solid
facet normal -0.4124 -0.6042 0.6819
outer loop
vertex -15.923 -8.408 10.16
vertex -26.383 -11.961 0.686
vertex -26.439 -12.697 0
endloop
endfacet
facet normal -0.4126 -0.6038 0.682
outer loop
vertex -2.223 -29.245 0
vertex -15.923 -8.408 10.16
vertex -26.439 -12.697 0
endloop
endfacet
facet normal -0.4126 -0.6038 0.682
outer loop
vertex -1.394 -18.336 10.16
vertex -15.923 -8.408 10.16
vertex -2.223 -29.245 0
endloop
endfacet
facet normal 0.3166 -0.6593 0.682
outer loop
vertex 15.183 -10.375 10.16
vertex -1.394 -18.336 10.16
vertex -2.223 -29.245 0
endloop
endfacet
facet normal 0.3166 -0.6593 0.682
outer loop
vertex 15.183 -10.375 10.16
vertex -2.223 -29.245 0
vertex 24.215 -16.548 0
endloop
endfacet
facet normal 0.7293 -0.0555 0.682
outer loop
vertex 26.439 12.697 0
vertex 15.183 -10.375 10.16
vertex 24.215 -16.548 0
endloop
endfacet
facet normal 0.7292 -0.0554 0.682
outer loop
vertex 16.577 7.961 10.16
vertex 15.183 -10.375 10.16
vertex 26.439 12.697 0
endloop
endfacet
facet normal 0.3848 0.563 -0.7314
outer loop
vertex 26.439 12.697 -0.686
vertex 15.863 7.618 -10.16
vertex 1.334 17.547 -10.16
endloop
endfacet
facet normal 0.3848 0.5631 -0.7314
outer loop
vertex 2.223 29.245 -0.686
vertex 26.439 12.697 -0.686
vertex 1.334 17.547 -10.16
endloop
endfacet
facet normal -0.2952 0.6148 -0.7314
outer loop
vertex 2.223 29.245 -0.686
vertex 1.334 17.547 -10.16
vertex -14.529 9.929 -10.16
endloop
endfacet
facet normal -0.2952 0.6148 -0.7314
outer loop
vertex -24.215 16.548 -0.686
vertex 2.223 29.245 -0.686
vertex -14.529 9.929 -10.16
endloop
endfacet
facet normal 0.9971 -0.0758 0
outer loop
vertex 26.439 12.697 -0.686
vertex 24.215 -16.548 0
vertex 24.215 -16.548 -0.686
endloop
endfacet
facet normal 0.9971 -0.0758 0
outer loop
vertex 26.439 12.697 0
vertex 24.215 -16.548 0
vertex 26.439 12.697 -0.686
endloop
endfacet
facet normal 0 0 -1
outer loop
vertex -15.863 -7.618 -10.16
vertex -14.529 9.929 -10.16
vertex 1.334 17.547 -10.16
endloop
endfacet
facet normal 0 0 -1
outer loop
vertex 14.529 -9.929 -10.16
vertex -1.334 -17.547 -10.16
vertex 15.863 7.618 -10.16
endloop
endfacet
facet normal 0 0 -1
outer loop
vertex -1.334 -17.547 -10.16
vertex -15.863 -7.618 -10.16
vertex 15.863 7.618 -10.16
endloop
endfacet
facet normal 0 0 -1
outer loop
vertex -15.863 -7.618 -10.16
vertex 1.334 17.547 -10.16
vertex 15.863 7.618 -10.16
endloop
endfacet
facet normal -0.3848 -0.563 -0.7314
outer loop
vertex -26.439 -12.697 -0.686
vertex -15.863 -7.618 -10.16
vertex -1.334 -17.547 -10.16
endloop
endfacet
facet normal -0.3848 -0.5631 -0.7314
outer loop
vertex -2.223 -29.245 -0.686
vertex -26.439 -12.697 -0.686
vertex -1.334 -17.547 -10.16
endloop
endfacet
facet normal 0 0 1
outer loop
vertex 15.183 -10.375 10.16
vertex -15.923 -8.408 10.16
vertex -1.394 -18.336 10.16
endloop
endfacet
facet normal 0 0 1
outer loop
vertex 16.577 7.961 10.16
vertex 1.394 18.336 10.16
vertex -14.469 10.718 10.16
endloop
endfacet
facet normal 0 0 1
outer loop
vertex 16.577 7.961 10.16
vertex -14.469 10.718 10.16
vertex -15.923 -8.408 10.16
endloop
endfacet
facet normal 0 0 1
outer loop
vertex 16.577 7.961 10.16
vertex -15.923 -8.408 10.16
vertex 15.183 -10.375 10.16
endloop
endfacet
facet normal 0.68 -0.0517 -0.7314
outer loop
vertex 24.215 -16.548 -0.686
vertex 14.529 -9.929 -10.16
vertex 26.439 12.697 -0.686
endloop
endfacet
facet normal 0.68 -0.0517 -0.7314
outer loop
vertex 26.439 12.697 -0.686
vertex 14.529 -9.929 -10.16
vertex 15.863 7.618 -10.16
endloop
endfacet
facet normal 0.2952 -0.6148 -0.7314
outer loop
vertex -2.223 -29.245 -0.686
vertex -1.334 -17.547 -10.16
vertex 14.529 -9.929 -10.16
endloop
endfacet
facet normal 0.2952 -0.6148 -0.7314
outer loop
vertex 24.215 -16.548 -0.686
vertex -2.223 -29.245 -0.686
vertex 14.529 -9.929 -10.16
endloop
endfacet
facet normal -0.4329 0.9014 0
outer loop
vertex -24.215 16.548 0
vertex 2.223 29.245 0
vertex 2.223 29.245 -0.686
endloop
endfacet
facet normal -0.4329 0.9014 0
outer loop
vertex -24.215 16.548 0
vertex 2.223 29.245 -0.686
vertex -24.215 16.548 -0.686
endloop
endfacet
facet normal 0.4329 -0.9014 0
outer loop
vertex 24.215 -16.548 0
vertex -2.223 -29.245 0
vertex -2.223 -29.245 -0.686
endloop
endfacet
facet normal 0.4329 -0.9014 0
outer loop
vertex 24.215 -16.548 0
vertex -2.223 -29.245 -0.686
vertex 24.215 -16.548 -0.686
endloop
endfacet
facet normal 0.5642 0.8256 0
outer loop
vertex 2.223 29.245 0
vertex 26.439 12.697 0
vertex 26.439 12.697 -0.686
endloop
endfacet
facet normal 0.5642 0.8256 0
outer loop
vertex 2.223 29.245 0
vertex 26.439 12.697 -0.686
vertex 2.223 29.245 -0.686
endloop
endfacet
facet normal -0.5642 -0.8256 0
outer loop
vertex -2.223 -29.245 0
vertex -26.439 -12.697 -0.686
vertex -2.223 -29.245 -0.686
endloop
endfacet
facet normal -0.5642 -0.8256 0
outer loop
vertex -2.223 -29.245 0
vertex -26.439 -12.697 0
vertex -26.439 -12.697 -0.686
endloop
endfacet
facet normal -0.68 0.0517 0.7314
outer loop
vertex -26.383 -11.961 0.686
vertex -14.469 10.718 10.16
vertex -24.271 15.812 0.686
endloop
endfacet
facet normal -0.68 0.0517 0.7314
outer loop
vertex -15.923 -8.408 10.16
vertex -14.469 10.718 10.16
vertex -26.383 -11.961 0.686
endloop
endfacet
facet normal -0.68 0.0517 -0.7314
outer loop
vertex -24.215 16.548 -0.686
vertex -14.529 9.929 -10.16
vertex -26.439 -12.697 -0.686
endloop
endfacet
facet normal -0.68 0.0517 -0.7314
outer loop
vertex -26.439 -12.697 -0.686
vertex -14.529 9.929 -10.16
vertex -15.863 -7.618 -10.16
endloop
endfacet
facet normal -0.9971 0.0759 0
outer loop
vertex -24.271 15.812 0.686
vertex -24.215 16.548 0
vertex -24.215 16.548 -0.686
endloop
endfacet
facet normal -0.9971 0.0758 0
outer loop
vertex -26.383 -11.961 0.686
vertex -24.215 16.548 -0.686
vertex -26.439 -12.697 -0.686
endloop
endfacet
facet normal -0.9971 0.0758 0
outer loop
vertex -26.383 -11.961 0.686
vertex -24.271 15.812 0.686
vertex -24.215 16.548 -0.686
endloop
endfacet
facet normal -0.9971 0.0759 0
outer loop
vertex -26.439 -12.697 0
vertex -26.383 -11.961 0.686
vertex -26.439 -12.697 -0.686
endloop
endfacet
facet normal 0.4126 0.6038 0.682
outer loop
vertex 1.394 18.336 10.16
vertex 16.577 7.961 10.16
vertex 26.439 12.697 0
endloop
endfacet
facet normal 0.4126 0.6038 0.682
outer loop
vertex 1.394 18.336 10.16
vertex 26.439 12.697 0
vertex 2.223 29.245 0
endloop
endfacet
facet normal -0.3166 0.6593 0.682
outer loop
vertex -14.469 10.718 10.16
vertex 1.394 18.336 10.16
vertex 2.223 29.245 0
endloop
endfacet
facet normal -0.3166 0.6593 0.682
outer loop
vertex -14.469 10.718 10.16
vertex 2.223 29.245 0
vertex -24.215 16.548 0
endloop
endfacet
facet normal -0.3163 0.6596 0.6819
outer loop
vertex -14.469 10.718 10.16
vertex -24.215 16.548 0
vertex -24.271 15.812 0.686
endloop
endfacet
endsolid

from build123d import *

# Parameters (mm, degrees)
F1_DEPTH     = 10.16
F2_C1_SIZE2  = 10.16
F2_C1_SIZE   = 9.4743532752
F2_C2_SIZE2  = 10.16
F2_C2_SIZE   = 9.4743532752
F2_C3_SIZE2  = 10.16
F2_C3_SIZE   = 9.4743532752
F2_C4_SIZE2  = 9.4743532752
F2_C4_SIZE   = 10.16
F2_C5_SIZE2  = 10.16
F2_C5_SIZE   = 9.4743532752
F2_C6_SIZE2  = 9.4743532752
F2_C6_SIZE   = 10.16
F2_C7_SIZE2  = 10.16
F2_C7_SIZE   = 9.4743532752
F2_C8_SIZE2  = 9.4743532752
F2_C8_SIZE   = 10.16
F2_C9_SIZE2  = 10.16
F2_C9_SIZE   = 9.4743532752
F2_C10_SIZE2 = 9.4743532752
F2_C10_SIZE  = 10.16
F2_C11_SIZE2 = 9.4743532752
F2_C11_SIZE  = 10.16
F2_C12_SIZE2 = 10.16
F2_C12_SIZE  = 9.4743532752


with BuildPart() as f1:
    # F0 (on Top) → F1 (new body, symmetric)
    with BuildSketch(Plane.XY):
        Polygon((-24.2152860866, 16.5479078158), (-26.4385515912, -12.697099003), (-2.2232655046, -29.2450068188), (24.2152860866, -16.5479078158), (26.4385515912, 12.697099003), (2.2232655046, 29.2450068188), align=None)
    extrude(amount=F1_DEPTH, both=True)

    # F2: chamfer of 10.16 x 9.4743532752 on 12 edges, made by hand

    # F2_c1
    f2_c1_edges = [f1.edges().sort_by_distance(p)[0] for p in [
        (-25.3269188389, 1.9254044064, -10.16),
    ]]
    f2_c1_side = f1.faces().sort_by_distance((-25.3269188389, 1.9254044064, -9.9705129345))[0]
    chamfer(f2_c1_edges, length=F2_C1_SIZE, length2=F2_C1_SIZE2, reference=f2_c1_side)

    # F2_c2
    f2_c2_edges = [f1.edges().sort_by_distance(p)[0] for p in [
        (-25.3269188389, 1.9254044064, 10.16),
    ]]
    f2_c2_side = f1.faces().sort_by_distance((-25.3269188389, 1.9254044064, 9.9705129345))[0]
    chamfer(f2_c2_edges, length=F2_C2_SIZE, length2=F2_C2_SIZE2, reference=f2_c2_side)

    # F2_c3
    f2_c3_edges = [f1.edges().sort_by_distance(p)[0] for p in [
        (-5.7082999727, 25.4358771179, -10.16),
    ]]
    f2_c3_side = f1.faces().sort_by_distance((-5.7082999727, 25.4358771179, -9.9705129345))[0]
    chamfer(f2_c3_edges, length=F2_C3_SIZE, length2=F2_C3_SIZE2, reference=f2_c3_side)

    # F2_c4
    f2_c4_edges = [f1.edges().sort_by_distance(p)[0] for p in [
        (-5.7082999727, 25.4358771179, 10.16),
    ]]
    f2_c4_side = f1.faces().sort_by_distance((-5.7082999727, 25.4358771179, 9.9705129345))[0]
    chamfer(f2_c4_edges, length=F2_C4_SIZE, length2=F2_C4_SIZE2, reference=f2_c4_side)

    # F2_c5
    f2_c5_edges = [f1.edges().sort_by_distance(p)[0] for p in [
        (19.1739657652, 17.6614713477, -10.16),
    ]]
    f2_c5_side = f1.faces().sort_by_distance((19.1739657652, 17.6614713477, -9.9705129345))[0]
    chamfer(f2_c5_edges, length=F2_C5_SIZE, length2=F2_C5_SIZE2, reference=f2_c5_side)

    # F2_c6
    f2_c6_edges = [f1.edges().sort_by_distance(p)[0] for p in [
        (18.8471324661, 17.8848181744, 10.16),
    ]]
    f2_c6_side = f1.faces().sort_by_distance((18.8471324661, 17.8848181744, 9.9705129345))[0]
    chamfer(f2_c6_edges, length=F2_C6_SIZE, length2=F2_C6_SIZE2, reference=f2_c6_side)

    # F2_c7
    f2_c7_edges = [f1.edges().sort_by_distance(p)[0] for p in [
        (24.882265738, -7.7744057701, -10.16),
    ]]
    f2_c7_side = f1.faces().sort_by_distance((24.882265738, -7.7744057701, -9.9705129345))[0]
    chamfer(f2_c7_edges, length=F2_C7_SIZE, length2=F2_C7_SIZE2, reference=f2_c7_side)

    # F2_c8
    f2_c8_edges = [f1.edges().sort_by_distance(p)[0] for p in [
        (24.9122731142, -7.3796864169, 10.16),
    ]]
    f2_c8_side = f1.faces().sort_by_distance((24.9122731142, -7.3796864169, 9.9705129345))[0]
    chamfer(f2_c8_edges, length=F2_C8_SIZE, length2=F2_C8_SIZE2, reference=f2_c8_side)

    # F2_c9
    f2_c9_edges = [f1.edges().sort_by_distance(p)[0] for p in [
        (5.7082999727, -25.4358771179, -10.16),
    ]]
    f2_c9_side = f1.faces().sort_by_distance((5.7082999727, -25.4358771179, -9.9705129345))[0]
    chamfer(f2_c9_edges, length=F2_C9_SIZE, length2=F2_C9_SIZE2, reference=f2_c9_side)

    # F2_c10
    f2_c10_edges = [f1.edges().sort_by_distance(p)[0] for p in [
        (6.0651406481, -25.2645045914, 10.16),
    ]]
    f2_c10_side = f1.faces().sort_by_distance((6.0651406481, -25.2645045914, 9.9705129345))[0]
    chamfer(f2_c10_edges, length=F2_C10_SIZE, length2=F2_C10_SIZE2, reference=f2_c10_side)

    # F2_c11
    f2_c11_edges = [f1.edges().sort_by_distance(p)[0] for p in [
        (-14.0040752488, -21.1943997376, 10.16),
    ]]
    f2_c11_side = f1.faces().sort_by_distance((-14.0040752488, -21.1943997376, 9.9705129345))[0]
    chamfer(f2_c11_edges, length=F2_C11_SIZE, length2=F2_C11_SIZE2, reference=f2_c11_side)

    # F2_c12
    f2_c12_edges = [f1.edges().sort_by_distance(p)[0] for p in [
        (-14.3309085479, -20.9710529109, -10.16),
    ]]
    f2_c12_side = f1.faces().sort_by_distance((-14.3309085479, -20.9710529109, -9.9705129345))[0]
    chamfer(f2_c12_edges, length=F2_C12_SIZE, length2=F2_C12_SIZE2, reference=f2_c12_side)


solid = f1.part
